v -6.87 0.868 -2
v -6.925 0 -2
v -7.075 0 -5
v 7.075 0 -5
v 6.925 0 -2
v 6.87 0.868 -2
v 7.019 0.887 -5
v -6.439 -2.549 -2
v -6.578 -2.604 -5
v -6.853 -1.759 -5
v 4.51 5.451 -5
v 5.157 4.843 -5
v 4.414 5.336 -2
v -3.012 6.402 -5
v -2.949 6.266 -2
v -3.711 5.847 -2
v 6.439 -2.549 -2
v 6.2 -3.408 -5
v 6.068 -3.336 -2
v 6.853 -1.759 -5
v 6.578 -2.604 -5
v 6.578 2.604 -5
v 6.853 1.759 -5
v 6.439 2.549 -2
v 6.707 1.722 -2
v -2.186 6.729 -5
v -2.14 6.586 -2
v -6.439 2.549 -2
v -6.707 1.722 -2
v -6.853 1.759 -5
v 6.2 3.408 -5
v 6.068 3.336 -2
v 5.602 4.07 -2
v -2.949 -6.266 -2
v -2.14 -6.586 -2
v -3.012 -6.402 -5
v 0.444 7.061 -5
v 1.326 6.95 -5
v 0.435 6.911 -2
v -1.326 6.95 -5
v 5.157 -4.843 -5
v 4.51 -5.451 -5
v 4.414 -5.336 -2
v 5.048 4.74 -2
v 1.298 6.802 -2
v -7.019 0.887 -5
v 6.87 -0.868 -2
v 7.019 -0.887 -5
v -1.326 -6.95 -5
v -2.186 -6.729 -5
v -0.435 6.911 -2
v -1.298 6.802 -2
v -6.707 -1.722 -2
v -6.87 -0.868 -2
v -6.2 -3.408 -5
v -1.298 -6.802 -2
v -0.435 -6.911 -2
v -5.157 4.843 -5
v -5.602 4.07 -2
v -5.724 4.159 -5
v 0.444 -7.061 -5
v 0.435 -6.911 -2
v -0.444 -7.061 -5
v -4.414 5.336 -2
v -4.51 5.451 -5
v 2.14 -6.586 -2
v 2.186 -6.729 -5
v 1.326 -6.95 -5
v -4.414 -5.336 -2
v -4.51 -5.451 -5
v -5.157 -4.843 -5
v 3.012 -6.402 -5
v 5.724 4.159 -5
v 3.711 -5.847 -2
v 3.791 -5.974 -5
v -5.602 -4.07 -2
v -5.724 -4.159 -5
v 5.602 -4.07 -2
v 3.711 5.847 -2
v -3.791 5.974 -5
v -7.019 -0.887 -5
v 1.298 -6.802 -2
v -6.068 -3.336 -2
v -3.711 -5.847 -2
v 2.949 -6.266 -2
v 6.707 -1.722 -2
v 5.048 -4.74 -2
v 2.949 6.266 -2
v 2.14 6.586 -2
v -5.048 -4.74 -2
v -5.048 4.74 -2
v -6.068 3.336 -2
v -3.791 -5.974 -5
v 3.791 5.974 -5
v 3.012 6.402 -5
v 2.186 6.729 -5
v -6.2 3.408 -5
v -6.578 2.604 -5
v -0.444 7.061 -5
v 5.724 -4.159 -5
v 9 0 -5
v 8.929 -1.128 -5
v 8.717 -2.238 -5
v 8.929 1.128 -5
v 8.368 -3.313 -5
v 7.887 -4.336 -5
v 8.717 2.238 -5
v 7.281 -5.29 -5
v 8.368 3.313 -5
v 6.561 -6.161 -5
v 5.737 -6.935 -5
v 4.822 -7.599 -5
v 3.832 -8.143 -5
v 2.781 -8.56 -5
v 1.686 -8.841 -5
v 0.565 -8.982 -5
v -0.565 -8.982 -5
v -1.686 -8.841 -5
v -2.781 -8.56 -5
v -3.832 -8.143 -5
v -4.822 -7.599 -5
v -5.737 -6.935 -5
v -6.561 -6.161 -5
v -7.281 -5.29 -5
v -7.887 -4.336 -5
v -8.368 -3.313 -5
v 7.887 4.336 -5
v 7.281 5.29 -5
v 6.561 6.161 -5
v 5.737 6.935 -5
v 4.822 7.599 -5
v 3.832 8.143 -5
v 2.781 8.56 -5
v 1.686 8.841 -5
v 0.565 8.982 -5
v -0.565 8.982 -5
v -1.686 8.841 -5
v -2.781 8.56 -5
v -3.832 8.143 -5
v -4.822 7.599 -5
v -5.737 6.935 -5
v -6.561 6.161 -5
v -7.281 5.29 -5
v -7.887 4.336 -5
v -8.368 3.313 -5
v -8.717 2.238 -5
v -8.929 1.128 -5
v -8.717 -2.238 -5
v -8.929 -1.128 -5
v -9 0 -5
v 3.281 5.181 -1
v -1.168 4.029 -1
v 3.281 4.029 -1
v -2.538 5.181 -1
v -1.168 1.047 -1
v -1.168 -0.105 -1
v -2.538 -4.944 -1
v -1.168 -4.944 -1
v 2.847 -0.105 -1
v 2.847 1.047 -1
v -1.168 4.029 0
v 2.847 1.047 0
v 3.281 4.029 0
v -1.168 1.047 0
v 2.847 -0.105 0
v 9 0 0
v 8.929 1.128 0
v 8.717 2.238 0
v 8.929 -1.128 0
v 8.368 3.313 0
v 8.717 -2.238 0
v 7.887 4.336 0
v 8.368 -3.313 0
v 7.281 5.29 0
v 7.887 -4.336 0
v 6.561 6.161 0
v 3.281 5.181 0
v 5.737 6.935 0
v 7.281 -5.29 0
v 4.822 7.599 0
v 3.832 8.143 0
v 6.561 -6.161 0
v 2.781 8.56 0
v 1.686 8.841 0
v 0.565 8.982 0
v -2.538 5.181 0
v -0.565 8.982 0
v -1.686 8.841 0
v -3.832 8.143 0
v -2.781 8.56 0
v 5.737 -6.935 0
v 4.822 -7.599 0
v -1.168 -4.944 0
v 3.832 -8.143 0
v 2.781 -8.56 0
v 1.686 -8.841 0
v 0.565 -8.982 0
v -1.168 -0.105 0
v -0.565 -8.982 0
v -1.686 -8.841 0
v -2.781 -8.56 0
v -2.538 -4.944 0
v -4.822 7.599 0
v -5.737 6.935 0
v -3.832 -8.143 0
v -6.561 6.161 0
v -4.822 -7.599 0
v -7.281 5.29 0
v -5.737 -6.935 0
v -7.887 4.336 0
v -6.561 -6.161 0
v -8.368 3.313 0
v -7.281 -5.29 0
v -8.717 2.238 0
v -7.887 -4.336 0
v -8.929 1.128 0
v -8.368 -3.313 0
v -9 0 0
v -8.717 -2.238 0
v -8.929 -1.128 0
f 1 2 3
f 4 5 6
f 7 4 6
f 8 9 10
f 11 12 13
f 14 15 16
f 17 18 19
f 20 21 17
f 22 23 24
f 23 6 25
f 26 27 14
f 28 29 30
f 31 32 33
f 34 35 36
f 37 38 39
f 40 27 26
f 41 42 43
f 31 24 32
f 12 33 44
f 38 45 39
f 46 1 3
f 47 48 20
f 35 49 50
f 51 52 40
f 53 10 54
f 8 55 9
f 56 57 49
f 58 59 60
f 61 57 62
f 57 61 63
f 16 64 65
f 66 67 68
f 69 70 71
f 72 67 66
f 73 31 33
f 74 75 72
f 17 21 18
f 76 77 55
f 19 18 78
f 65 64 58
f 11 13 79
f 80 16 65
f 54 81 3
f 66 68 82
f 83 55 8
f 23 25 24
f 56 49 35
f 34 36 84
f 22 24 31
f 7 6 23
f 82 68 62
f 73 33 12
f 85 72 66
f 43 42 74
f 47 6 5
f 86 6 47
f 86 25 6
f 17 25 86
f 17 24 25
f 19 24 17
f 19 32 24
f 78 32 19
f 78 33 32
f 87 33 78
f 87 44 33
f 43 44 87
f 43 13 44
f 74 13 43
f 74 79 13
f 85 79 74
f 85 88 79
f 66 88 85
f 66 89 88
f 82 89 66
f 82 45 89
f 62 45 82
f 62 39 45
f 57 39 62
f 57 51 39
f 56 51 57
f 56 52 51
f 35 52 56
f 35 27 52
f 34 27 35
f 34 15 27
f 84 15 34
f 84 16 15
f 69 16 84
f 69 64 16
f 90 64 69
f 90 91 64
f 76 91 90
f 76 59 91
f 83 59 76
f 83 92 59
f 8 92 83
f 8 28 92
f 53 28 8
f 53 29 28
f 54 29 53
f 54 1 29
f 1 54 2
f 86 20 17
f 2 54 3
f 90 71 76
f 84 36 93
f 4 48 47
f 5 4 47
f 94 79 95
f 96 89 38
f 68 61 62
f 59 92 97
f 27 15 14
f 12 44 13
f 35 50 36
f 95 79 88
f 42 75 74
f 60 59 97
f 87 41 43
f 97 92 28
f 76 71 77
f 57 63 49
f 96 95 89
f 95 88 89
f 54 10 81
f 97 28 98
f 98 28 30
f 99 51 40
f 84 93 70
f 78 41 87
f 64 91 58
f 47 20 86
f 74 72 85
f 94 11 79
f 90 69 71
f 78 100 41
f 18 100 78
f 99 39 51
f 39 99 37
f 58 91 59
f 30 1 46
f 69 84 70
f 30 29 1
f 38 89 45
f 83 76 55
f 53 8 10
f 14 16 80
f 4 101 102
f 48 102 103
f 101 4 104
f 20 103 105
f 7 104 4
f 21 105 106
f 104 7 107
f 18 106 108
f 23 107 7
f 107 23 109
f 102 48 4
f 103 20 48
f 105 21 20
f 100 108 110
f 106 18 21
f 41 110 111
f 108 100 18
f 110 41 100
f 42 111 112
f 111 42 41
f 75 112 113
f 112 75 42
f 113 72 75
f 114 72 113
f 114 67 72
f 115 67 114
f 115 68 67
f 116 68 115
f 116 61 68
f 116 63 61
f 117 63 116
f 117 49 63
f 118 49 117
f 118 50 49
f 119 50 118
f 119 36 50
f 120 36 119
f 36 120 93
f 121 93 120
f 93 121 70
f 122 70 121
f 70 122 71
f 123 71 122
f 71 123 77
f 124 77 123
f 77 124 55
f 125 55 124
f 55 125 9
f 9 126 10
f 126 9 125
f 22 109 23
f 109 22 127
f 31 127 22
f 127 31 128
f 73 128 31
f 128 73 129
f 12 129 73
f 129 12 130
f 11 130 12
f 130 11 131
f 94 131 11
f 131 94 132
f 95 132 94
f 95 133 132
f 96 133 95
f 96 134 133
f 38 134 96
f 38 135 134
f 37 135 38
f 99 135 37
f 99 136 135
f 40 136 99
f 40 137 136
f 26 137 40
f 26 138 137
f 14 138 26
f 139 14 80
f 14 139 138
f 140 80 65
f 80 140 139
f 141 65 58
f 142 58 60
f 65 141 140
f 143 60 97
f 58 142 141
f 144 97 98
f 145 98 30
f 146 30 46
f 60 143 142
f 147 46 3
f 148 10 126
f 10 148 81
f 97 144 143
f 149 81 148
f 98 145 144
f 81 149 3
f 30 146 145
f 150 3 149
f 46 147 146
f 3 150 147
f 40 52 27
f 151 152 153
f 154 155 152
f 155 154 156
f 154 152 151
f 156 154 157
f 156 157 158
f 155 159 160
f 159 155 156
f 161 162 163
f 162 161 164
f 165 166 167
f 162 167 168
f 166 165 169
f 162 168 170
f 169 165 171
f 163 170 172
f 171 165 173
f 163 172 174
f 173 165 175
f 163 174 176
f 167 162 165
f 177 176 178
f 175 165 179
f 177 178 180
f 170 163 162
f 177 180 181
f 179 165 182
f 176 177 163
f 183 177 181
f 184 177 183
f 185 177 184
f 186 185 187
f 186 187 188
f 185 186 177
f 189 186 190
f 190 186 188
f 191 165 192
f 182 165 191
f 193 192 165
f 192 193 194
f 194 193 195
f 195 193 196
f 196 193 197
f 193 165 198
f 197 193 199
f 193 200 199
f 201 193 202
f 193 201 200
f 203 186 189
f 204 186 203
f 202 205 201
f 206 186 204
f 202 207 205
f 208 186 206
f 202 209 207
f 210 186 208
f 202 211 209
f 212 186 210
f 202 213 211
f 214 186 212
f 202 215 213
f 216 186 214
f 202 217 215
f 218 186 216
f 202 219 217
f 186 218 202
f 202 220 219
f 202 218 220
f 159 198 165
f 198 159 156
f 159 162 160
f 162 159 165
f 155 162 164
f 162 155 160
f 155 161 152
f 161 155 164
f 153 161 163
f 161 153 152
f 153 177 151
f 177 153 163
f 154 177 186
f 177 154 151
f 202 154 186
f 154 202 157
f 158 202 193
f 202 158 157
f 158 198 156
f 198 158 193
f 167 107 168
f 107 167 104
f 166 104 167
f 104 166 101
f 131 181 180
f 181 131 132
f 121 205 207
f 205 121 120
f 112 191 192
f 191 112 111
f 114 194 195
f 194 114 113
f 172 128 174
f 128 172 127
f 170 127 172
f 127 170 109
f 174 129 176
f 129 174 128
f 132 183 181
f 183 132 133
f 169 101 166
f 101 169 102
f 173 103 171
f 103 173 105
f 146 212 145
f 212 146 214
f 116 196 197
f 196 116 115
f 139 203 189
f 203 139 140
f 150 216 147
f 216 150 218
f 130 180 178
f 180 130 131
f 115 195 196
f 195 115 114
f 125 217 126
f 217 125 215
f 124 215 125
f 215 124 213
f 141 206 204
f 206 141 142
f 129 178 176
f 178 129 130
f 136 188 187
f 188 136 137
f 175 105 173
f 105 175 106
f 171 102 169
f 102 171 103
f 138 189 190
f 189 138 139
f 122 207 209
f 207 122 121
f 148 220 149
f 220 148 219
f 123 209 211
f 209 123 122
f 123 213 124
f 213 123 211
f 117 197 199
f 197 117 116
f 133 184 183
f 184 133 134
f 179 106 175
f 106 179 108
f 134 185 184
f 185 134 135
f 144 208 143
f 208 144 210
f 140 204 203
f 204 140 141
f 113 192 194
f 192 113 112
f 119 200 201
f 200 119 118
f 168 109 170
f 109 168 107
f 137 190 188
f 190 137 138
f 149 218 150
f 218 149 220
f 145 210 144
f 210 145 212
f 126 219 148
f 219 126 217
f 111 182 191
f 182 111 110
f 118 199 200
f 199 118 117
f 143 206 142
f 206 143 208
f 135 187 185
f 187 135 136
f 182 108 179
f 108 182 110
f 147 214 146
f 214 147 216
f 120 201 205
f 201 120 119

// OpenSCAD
$fn = 50;


difference() {
	union() {
		translate(v = [0, 0, -5.0000000000]) {
			cylinder(h = 5, r = 9.0000000000);
		}
	}
	union() {
		#translate(v = [0, 0, -5.0000000000]) {
			cylinder(h = 3, r1 = 7.0750000000, r2 = 6.9250000000);
		}
		translate(v = [0, 0, -1]) {
			linear_extrude(height = 1) {
				text(font = "Impact", halign = "center", size = 10, text = "F", valign = "center");
			}
		}
	}
}
